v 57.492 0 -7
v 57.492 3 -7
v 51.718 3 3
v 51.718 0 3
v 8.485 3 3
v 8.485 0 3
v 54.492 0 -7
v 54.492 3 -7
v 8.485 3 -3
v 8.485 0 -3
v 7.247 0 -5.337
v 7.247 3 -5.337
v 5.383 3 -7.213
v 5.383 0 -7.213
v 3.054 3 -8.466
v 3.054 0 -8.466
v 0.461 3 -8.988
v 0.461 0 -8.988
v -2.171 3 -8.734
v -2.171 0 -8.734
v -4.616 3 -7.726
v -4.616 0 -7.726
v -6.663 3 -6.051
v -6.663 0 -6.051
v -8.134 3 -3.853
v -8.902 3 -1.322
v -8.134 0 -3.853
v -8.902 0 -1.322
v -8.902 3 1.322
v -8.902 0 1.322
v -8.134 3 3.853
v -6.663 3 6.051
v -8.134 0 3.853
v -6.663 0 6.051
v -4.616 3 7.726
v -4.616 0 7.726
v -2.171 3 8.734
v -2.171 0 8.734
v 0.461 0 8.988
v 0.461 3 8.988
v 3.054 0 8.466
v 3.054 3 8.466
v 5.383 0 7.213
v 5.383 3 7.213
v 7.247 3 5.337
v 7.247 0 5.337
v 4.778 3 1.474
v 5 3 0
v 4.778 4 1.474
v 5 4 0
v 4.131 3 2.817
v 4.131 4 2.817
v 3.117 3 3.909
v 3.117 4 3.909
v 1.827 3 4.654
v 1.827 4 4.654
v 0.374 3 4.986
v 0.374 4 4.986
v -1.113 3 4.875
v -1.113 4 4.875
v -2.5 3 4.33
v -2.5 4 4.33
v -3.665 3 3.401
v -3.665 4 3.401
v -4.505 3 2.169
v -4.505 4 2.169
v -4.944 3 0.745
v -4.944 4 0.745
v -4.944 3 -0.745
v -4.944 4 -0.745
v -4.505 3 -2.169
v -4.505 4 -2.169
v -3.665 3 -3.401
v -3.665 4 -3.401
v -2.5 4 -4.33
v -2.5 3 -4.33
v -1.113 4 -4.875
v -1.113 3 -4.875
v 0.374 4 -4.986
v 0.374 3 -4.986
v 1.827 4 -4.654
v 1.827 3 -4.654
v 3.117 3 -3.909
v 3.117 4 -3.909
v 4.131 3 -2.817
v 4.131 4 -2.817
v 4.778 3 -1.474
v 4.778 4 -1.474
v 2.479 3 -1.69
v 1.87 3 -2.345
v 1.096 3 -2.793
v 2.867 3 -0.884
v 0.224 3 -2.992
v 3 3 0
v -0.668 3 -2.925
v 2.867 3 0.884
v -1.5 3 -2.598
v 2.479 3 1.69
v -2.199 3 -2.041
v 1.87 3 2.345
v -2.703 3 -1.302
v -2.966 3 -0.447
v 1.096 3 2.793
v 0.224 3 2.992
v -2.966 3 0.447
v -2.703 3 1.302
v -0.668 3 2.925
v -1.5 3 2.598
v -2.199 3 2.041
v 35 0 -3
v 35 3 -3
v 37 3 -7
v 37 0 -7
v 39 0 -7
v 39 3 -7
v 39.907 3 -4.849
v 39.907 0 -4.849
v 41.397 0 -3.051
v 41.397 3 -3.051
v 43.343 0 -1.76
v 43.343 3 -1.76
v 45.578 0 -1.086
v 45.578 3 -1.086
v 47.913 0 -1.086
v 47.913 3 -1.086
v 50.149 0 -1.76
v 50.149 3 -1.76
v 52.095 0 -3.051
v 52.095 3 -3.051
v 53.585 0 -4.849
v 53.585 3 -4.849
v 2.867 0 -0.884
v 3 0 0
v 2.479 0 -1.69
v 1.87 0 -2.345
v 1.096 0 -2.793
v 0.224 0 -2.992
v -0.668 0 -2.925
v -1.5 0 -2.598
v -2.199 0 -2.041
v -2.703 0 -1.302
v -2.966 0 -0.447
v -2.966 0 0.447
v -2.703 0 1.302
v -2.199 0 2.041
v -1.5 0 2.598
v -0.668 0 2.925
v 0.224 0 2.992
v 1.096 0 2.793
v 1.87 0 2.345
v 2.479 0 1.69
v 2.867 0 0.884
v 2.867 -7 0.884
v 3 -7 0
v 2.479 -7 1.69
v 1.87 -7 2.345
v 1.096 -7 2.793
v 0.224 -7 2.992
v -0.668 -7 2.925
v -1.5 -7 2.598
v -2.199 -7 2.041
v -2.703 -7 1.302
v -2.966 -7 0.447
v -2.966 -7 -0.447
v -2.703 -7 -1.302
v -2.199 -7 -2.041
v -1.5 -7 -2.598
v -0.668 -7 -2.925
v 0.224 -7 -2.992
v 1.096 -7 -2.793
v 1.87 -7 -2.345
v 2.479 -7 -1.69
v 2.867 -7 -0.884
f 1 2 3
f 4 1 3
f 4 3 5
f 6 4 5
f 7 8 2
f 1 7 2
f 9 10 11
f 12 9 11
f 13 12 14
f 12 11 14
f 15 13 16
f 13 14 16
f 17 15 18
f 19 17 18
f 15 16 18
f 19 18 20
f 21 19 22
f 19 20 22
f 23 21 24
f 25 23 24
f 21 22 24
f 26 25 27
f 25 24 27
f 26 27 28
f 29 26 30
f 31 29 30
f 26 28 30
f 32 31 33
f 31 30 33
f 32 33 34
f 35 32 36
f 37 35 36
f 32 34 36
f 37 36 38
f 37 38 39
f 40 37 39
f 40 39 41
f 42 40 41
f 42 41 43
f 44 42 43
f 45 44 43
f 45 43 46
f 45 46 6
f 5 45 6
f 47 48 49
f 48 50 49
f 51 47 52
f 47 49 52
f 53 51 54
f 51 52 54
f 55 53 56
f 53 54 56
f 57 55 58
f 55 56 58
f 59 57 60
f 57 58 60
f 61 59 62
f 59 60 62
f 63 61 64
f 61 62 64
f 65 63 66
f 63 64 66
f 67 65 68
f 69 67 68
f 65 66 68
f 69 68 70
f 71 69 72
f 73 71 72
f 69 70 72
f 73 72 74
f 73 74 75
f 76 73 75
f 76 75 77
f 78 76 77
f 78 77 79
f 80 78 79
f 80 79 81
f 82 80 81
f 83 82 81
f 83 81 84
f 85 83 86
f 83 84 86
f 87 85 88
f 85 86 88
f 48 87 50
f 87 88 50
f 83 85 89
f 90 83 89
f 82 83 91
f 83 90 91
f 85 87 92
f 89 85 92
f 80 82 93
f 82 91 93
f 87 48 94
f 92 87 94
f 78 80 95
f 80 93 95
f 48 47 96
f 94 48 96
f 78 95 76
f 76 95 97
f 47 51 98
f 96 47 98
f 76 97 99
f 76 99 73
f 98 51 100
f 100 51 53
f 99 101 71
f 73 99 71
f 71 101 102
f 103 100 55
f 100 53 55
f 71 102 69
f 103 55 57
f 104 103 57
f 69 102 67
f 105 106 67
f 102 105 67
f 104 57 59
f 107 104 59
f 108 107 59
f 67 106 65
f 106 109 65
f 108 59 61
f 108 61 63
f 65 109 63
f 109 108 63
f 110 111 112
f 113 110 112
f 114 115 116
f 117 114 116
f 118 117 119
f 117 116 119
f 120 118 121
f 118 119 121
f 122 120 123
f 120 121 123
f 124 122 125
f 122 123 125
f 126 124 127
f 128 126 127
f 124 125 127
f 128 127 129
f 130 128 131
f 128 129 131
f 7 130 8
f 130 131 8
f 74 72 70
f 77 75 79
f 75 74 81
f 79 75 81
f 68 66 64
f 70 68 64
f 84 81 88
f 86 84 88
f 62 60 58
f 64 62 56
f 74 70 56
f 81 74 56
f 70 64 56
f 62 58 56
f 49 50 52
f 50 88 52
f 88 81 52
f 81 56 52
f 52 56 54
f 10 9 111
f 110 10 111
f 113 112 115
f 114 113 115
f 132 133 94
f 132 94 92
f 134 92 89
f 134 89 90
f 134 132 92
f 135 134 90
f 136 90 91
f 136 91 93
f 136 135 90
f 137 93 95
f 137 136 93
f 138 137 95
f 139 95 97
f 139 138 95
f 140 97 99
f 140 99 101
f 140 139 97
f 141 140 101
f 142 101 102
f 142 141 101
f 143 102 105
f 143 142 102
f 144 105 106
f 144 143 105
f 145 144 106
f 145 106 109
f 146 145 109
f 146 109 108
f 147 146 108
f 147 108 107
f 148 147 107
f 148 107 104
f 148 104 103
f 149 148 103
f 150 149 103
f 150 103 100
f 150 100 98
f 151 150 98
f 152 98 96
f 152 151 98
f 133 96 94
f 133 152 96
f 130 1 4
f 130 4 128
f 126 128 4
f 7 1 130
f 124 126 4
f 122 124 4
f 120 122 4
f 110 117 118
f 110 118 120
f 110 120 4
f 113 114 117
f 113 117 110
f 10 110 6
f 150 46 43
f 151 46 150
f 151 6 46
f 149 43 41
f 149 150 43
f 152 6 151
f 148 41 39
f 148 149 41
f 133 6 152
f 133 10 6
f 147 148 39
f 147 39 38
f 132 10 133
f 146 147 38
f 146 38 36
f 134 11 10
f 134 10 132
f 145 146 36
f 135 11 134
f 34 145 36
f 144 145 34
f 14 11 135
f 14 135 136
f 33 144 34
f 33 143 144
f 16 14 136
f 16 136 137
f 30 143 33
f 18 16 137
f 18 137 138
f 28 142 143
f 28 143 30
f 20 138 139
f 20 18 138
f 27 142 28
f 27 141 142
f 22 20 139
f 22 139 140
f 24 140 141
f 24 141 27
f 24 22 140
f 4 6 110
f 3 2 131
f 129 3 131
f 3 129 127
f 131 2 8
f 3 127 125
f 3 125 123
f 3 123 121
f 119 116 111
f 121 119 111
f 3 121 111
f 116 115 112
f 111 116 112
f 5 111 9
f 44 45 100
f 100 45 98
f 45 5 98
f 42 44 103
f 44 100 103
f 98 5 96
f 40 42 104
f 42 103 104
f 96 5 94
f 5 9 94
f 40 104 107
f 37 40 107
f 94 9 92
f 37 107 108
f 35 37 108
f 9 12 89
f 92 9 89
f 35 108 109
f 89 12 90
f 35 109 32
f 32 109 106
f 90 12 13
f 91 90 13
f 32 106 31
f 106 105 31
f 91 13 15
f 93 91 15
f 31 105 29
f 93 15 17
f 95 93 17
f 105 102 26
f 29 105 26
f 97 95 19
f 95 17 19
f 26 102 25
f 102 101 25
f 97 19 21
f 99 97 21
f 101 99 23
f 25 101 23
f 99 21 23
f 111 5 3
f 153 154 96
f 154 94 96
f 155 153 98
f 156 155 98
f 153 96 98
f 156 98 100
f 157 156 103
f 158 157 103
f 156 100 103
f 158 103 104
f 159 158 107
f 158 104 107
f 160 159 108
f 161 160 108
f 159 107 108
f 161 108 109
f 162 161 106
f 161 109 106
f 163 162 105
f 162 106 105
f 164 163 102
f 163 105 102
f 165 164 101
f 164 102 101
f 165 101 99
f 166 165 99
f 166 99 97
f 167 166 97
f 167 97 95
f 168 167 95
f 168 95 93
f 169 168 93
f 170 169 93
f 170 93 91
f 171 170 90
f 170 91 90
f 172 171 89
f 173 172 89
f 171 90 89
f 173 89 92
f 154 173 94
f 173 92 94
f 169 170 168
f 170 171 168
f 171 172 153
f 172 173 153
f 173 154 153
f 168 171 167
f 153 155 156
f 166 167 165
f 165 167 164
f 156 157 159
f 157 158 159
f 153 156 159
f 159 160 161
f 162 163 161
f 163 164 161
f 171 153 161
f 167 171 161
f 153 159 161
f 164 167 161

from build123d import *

# Parameters (mm, degrees)
IZIM1_R                     = 9
IZIM1_R_2                   = 3
Y_KSEKLIK_EKSTR_ZYON1_DEPTH = 3
Y_KSEKLIK_EKSTR_ZYON2_DEPTH = 3


with BuildPart() as part:
    # Çizim1 → Yükseklik-Ekstrüzyon1 (new body)
    with BuildSketch(Plane(origin=(0, 0, 0), x_dir=(1, 0, 0), z_dir=(0, 1, 0))):
        Circle(IZIM1_R)
        Circle(IZIM1_R_2, mode=Mode.SUBTRACT)
    extrude(amount=Y_KSEKLIK_EKSTR_ZYON1_DEPTH)

    # Çizim3 → Yükseklik-Ekstrüzyon2 (add)
    with BuildSketch(Plane(origin=(0, 3, 0), x_dir=(1, 0, 0), z_dir=(0, 1, 0))):
        with BuildLine():
            Line((8.485281374, 3), (35, 3))
            Line((35, 3), (37, 7))
            Line((37, 7), (39, 7))
            ThreePointArc((39, 7), (46.745966692, 1), (54.491933385, 7))
            Line((54.491933385, 7), (57.491933385, 7))
            Line((57.491933385, 7), (51.718430693, -3))
            Line((51.718430693, -3), (8.485281374, -3))
            ThreePointArc((8.485281374, -3), (9, 0), (8.485281374, 3))
        make_face()
    extrude(amount=-Y_KSEKLIK_EKSTR_ZYON2_DEPTH)


with BuildPart() as body_2:
    # Çizim5 → Döndür1 (revolve)
    with BuildSketch(Plane.XY):
        Polygon((0, 3), (0, -7), (3, -7), (3, 3), (5, 3), (5, 4), (0, 4), align=None)
    revolve(axis=Axis((0, 3, 0), (0, -1, 0)))


solid = Compound([part.part, body_2.part])
